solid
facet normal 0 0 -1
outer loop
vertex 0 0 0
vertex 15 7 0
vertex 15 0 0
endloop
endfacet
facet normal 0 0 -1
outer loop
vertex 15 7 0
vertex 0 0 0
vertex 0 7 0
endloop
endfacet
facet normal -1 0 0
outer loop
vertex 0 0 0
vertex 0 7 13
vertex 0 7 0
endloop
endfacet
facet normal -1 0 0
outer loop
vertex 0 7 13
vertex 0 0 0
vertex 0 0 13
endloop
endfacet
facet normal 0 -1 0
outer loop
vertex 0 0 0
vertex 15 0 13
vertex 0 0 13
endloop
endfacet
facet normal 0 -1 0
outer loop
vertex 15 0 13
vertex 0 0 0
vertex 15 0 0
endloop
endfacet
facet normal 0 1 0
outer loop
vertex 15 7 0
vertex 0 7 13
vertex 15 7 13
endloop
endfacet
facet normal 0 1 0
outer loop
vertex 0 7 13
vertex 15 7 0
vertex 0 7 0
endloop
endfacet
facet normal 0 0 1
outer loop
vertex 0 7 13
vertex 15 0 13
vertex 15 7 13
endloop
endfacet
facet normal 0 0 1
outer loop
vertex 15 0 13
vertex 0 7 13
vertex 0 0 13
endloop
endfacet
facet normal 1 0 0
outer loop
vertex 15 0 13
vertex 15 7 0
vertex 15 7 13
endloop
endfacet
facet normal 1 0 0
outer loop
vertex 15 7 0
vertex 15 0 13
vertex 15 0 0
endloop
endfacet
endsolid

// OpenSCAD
translate([1.5, 1.0, 2.5]) color([0.533638651221174, 0.11818482376773232, 0.8594532404023933]) cube([3, 2, 5], center=true);
translate([4.5, 1.0, 2.5]) color([0.8906989166138923, 0.7620005545284954, 0.06809296768032302]) cube([3, 2, 5], center=true);
translate([1.5, 3.0, 2.5]) color([0.8609410769469436, 0.2827478909480132, 0.13442052583382869]) cube([3, 2, 5], center=true);
translate([4.5, 3.0, 2.5]) color([0.5230599837537087, 0.21027834364306774, 0.10530639745894443]) cube([3, 2, 5], center=true);
translate([1.0, 5.5, 2.5]) color([0.9556548717215211, 0.5435731515542631, 0.7414270622920264]) cube([2, 3, 5], center=true);
translate([3.0, 5.5, 2.5]) color([0.9040457292510377, 0.2786145977098805, 0.4423646135017597]) cube([2, 3, 5], center=true);
translate([5.0, 5.5, 2.5]) color([0.5682329433322765, 0.13781274972163116, 0.1232982180791492]) cube([2, 3, 5], center=true);
translate([2.5, 3.5, 6.5]) color([0.12051785276403837, 0.4012165411640888, 0.4679428423906348]) cube([5, 7, 3], center=true);
translate([1.5, 3.5, 10.5]) color([0.5596131508667647, 0.29896126951320356, 0.6321114709426877]) cube([3, 7, 5], center=true);
translate([4.5, 3.5, 10.5]) color([0.7423454703026071, 0.21800995973285464, 0.48885816108208613]) cube([3, 7, 5], center=true);
translate([7.5, 3.5, 6.5]) color([0.501567157493831, 0.49271975198428686, 0.958422556968198]) cube([5, 7, 3], center=true);
translate([7.5, 3.5, 2.5]) color([0.44398175403613704, 0.14281143058247625, 0.4955231327742775]) cube([3, 7, 5], center=true);
translate([7.5, 3.5, 10.5]) color([0.8873352305676206, 0.21571394075115613, 0.3554013630116646]) cube([3, 7, 5], center=true);
translate([10.5, 3.5, 2.5]) color([0.39096604949642, 0.9928835035123682, 0.8462248334797323]) cube([3, 7, 5], center=true);
translate([10.5, 3.5, 10.5]) color([0.9789066021625461, 0.6868956228130294, 0.08137290691060206]) cube([3, 7, 5], center=true);
translate([12.5, 3.5, 6.5]) color([0.9493092651810784, 0.9246190463677613, 0.3951154575230438]) cube([5, 7, 3], center=true);
translate([13.5, 3.5, 2.5]) color([0.3612783181755085, 0.11615210489091876, 0.0037403702712440756]) cube([3, 7, 5], center=true);
translate([13.5, 3.5, 10.5]) color([0.2703277384724262, 0.6403732426441148, 0.29252642189785794]) cube([3, 7, 5], center=true);
